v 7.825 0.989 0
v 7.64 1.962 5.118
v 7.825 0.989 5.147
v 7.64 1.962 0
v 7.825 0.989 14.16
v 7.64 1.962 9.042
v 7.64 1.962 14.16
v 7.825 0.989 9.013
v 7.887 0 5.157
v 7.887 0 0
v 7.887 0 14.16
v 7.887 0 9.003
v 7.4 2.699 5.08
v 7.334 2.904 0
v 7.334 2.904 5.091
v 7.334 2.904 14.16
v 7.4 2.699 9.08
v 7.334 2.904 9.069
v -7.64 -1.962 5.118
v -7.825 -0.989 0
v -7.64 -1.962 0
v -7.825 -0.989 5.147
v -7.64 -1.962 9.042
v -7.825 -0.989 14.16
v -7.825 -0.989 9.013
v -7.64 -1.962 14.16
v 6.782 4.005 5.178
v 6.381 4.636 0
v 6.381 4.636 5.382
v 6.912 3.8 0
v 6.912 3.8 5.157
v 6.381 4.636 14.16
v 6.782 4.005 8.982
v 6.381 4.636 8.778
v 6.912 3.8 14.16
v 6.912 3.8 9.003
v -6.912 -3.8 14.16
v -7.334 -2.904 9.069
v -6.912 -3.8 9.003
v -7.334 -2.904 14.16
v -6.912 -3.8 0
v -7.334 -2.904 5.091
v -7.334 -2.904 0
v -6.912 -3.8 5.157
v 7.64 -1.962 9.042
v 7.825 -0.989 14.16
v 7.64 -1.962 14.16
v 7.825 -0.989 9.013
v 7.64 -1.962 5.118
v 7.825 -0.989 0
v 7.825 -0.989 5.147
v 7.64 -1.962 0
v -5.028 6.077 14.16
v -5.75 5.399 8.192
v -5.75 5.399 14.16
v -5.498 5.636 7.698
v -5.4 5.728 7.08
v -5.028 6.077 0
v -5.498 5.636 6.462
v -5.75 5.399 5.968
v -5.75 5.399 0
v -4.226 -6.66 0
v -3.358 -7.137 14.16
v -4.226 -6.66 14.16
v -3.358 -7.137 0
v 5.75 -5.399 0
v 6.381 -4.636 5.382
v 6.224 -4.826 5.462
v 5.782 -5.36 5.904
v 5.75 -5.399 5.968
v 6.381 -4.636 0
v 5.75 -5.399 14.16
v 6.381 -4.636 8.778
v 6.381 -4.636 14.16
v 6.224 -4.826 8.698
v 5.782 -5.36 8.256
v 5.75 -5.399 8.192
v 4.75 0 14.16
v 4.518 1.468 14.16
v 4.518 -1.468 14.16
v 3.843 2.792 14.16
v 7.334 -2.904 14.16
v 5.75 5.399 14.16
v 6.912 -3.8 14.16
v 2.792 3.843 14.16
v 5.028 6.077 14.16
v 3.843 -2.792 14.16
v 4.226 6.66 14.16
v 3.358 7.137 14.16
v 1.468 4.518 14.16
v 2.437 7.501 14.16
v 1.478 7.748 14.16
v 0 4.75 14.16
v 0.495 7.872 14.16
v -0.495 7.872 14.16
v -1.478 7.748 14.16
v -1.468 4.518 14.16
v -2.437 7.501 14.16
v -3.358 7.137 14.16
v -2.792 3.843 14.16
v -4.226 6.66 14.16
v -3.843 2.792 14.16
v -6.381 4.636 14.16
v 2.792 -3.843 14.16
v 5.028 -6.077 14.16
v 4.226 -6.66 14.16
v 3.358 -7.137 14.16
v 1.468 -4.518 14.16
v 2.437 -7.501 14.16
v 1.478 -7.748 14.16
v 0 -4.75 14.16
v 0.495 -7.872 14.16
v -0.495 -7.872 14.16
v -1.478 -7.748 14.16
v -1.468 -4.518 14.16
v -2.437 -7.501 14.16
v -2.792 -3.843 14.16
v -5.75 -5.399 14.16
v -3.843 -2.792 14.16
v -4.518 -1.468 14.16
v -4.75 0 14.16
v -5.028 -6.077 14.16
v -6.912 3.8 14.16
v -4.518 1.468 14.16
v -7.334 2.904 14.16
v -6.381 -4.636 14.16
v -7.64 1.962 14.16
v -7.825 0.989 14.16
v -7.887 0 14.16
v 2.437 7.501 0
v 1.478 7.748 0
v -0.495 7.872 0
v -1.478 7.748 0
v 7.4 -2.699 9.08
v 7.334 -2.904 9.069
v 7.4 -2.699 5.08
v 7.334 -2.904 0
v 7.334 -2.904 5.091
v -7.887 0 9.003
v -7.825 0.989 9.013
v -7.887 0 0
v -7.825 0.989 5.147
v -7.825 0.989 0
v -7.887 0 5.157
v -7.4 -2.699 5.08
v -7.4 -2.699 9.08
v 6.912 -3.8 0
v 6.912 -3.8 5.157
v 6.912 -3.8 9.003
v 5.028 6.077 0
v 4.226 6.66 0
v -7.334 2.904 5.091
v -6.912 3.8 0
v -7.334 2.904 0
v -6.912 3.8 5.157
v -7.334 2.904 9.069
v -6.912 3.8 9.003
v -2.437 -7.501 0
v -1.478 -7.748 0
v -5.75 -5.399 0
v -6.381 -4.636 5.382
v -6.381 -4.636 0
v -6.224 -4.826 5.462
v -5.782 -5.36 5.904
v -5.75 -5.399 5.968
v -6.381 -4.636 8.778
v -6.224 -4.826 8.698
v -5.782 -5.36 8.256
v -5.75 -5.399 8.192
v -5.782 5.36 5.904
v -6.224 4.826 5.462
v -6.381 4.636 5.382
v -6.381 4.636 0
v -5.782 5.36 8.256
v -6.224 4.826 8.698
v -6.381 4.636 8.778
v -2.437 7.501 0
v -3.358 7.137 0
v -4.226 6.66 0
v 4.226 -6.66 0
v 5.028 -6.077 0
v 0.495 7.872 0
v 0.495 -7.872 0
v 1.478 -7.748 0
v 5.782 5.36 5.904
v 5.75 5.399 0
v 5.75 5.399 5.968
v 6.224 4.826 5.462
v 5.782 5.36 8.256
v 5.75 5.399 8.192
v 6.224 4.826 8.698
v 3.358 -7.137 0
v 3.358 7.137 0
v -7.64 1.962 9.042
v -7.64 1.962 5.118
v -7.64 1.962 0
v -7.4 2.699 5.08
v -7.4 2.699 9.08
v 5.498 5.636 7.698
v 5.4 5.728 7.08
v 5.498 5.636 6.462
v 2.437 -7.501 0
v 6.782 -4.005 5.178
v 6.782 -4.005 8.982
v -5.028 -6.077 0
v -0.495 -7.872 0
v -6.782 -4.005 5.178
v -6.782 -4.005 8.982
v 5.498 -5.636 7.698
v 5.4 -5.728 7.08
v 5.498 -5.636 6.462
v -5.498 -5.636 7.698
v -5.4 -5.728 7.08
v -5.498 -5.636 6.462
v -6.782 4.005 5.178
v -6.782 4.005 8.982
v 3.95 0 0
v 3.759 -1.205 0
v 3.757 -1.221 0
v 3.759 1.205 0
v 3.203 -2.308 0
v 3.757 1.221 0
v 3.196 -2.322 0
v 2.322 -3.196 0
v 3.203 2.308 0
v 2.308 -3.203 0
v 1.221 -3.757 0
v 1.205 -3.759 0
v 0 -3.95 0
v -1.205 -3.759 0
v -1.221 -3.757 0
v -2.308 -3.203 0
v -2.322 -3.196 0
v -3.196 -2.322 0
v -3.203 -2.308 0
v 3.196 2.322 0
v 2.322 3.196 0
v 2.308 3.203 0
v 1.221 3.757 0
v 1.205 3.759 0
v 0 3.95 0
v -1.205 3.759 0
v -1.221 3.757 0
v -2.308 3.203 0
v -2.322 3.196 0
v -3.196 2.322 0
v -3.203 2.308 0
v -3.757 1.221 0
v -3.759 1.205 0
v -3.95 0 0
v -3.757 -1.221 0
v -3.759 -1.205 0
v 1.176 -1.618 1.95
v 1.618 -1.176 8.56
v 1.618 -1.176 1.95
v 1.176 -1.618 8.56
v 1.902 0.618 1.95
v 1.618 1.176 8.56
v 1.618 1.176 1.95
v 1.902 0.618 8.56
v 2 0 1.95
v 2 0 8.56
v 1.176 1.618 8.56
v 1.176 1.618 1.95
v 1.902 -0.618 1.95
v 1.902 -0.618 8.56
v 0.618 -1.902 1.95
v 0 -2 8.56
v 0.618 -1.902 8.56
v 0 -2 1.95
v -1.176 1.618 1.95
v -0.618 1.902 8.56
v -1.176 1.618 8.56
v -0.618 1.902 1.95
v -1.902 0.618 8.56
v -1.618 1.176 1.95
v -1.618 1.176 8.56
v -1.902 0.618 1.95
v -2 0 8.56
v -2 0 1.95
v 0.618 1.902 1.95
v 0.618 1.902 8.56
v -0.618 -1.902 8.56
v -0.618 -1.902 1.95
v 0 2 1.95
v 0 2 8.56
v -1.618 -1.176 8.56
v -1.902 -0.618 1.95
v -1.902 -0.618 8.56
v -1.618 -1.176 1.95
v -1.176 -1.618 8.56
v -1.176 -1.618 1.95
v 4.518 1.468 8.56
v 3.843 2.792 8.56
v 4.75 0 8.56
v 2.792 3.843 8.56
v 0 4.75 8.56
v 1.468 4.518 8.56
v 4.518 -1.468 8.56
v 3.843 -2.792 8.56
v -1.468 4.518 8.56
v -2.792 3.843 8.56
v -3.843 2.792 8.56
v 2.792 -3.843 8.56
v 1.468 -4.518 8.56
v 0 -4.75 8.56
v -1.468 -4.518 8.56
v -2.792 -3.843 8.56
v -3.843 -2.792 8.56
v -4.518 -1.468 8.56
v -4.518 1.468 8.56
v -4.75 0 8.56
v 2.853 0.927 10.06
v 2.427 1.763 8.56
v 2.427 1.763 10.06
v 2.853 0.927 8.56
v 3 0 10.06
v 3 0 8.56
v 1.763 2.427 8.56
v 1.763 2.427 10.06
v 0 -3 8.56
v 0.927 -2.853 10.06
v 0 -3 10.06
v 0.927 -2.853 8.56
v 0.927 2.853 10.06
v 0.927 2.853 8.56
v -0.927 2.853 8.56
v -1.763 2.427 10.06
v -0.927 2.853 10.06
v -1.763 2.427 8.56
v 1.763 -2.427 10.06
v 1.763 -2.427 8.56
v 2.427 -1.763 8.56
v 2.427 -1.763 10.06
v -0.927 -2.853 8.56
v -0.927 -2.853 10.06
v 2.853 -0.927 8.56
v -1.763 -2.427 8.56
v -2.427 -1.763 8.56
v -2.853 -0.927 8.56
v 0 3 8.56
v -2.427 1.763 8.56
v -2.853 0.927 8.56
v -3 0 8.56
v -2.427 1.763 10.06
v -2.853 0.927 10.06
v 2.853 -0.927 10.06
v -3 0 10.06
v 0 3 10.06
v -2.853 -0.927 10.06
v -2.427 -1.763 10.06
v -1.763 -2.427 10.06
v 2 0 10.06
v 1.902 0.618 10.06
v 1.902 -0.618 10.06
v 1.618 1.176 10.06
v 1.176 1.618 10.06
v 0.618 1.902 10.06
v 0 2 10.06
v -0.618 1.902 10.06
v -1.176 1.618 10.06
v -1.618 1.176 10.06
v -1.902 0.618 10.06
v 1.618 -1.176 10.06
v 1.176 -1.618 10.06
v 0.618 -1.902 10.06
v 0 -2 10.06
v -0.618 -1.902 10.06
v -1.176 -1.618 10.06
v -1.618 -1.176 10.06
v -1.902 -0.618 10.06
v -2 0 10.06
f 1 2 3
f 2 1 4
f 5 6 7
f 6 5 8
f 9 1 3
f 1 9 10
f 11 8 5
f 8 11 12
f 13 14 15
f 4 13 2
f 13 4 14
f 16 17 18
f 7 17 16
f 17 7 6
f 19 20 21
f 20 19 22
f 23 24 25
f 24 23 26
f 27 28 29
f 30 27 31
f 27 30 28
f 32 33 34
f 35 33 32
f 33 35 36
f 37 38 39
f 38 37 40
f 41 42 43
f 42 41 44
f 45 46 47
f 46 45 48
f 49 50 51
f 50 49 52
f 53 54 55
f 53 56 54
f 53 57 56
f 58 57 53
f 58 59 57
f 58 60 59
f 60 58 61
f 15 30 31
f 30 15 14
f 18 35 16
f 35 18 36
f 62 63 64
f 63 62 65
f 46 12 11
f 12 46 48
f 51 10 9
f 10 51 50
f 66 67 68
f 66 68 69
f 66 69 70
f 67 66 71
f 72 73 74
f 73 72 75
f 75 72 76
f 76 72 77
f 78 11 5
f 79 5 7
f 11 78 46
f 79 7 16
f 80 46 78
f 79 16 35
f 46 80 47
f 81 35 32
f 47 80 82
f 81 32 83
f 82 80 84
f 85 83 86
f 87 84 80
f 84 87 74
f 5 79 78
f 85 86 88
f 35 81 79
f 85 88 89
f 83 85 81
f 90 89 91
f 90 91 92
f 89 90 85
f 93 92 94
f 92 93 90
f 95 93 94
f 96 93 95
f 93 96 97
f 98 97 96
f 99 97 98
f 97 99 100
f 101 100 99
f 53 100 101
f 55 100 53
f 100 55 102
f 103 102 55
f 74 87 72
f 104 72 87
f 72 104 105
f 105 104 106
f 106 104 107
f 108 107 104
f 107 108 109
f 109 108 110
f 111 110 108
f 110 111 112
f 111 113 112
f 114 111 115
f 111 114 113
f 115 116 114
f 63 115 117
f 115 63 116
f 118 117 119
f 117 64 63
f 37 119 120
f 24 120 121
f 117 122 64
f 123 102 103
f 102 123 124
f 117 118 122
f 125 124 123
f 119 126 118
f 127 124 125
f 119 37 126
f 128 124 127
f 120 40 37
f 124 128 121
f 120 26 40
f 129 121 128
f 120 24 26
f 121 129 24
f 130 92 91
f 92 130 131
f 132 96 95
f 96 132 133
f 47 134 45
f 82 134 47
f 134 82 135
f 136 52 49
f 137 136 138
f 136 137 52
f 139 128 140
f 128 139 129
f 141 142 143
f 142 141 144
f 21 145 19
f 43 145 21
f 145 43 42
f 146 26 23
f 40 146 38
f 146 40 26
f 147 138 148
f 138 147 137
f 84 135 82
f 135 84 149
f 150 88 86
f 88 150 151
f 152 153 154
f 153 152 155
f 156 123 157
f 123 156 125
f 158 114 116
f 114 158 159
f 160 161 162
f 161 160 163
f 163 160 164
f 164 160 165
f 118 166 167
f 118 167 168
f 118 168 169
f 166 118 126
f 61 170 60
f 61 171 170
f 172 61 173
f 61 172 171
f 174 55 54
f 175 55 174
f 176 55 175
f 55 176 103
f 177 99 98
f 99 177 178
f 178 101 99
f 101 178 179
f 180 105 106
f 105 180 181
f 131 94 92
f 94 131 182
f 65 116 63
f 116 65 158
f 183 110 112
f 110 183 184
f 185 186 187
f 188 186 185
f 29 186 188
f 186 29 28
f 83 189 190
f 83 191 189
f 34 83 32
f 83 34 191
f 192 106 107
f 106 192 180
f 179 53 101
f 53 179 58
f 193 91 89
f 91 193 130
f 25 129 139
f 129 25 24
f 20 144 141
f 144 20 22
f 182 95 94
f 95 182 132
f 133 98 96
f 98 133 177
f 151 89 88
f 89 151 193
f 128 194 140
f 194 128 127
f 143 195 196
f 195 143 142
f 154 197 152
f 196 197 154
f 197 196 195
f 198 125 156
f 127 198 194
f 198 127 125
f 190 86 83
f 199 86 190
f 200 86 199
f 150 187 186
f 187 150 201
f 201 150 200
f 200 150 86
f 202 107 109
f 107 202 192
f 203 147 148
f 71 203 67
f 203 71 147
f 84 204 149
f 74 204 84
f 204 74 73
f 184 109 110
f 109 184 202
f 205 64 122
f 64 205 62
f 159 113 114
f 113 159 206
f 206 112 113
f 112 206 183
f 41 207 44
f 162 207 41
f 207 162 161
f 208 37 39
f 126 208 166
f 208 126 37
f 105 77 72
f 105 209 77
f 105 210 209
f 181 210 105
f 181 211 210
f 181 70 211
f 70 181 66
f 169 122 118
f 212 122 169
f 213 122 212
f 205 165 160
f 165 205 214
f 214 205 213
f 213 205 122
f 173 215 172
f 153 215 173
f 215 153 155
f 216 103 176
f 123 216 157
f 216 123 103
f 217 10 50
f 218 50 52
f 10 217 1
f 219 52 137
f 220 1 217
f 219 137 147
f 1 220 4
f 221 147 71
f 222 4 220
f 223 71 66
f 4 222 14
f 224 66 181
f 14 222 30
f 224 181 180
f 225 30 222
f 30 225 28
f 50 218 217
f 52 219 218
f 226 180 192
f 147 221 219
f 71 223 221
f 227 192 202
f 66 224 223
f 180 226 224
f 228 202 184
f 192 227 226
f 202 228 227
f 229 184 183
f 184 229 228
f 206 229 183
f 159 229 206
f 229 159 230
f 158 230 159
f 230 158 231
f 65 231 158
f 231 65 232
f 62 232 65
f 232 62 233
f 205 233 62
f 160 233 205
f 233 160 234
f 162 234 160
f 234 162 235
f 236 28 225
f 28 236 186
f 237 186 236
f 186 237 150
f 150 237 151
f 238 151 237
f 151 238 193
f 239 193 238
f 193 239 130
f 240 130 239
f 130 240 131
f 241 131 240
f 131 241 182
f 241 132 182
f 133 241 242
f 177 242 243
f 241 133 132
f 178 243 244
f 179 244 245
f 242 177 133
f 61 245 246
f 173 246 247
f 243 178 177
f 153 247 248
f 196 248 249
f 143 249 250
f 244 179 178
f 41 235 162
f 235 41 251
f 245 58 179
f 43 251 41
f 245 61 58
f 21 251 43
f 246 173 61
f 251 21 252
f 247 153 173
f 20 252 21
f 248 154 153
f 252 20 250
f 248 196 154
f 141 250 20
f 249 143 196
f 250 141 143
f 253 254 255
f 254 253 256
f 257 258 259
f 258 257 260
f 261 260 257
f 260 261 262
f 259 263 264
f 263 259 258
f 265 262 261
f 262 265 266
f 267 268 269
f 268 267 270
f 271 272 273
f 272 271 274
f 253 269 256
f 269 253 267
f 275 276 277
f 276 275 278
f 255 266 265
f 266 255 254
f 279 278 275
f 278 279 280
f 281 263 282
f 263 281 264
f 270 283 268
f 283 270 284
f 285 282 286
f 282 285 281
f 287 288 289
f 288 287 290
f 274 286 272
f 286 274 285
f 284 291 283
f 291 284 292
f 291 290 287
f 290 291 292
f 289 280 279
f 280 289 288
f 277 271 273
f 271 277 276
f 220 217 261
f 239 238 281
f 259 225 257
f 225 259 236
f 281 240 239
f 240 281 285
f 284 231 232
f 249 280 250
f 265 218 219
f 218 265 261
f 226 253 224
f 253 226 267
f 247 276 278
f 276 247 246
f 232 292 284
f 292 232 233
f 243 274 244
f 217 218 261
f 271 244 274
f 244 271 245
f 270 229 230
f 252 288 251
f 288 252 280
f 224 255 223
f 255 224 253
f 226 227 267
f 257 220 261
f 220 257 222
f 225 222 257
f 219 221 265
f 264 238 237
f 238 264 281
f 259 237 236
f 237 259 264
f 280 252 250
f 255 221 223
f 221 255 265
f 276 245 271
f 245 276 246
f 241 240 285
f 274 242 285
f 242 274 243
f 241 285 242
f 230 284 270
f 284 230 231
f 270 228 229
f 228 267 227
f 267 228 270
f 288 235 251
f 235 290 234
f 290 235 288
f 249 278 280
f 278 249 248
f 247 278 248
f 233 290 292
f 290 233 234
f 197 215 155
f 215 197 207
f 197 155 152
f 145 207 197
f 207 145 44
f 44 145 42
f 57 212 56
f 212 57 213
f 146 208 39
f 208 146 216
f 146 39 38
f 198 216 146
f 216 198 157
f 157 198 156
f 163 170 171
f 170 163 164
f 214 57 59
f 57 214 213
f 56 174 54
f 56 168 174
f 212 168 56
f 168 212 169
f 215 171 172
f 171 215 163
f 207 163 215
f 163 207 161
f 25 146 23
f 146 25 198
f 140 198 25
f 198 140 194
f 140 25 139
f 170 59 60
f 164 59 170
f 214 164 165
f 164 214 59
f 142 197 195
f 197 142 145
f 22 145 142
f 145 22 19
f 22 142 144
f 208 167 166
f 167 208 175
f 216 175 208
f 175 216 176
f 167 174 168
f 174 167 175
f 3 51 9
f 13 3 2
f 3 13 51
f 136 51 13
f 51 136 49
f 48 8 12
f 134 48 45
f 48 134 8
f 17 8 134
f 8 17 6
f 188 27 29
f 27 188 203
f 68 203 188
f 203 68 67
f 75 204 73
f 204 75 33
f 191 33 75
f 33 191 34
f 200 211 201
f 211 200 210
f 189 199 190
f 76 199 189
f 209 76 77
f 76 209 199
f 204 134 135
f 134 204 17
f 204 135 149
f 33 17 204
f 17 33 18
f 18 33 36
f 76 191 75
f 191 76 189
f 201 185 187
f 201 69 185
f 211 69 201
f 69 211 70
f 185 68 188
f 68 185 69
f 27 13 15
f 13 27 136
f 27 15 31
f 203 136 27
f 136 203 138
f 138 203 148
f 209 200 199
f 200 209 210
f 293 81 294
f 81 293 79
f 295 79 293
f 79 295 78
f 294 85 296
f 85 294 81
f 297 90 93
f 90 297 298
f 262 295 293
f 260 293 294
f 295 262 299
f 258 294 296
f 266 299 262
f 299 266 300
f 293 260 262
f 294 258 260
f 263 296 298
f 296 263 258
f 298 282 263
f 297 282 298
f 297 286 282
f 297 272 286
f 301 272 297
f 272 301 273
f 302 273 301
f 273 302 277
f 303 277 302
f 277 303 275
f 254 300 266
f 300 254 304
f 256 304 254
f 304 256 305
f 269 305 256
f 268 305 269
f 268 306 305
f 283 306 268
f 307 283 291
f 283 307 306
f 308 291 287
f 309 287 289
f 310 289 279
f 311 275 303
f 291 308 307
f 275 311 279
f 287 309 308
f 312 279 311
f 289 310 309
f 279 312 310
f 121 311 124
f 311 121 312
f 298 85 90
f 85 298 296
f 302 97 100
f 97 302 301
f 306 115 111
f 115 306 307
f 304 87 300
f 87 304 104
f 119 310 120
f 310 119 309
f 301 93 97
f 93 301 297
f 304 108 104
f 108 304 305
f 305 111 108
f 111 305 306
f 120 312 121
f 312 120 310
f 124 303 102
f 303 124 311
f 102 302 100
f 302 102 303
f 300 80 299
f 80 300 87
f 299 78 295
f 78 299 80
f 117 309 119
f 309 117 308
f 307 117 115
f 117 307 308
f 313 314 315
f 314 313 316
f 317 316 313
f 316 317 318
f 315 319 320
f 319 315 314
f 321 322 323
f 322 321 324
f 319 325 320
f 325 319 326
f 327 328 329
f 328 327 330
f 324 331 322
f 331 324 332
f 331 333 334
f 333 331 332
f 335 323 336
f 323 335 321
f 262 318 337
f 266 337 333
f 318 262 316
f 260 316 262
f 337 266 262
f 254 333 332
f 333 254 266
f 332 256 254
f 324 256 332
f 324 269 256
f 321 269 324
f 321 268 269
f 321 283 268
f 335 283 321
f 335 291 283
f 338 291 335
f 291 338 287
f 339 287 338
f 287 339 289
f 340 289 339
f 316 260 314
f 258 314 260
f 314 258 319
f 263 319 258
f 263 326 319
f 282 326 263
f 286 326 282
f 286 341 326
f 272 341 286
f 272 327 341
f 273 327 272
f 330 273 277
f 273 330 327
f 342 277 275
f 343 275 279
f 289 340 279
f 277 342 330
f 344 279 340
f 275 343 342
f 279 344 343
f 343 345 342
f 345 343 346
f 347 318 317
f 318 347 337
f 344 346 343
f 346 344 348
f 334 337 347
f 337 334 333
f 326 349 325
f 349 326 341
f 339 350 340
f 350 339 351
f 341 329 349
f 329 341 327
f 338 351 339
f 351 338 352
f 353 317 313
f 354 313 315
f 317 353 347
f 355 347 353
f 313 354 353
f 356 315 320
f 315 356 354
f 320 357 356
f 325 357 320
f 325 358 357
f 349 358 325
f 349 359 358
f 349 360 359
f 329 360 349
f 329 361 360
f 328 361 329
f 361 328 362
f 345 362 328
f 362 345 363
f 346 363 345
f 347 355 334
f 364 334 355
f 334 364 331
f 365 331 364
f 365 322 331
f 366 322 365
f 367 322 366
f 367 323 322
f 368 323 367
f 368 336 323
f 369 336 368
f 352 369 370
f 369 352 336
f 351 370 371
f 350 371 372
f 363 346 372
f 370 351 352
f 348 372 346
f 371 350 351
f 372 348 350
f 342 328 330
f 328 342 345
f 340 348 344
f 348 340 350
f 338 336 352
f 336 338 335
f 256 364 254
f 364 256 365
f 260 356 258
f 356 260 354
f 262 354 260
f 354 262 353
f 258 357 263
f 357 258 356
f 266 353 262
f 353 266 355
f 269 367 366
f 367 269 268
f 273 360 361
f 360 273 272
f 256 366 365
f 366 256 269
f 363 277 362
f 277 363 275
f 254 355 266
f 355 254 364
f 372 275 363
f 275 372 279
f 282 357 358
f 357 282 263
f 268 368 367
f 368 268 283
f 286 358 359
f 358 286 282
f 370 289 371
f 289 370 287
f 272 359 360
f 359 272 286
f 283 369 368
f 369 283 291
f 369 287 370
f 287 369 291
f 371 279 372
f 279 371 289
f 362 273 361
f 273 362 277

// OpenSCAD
tol = 0.1;

union(){

	difference(){
		// Main body:
		cylinder( r = 15.875/2 - tol/2, h = 4.76 + 4.64 + 4.76, $fn=50 );

		// Filament hole:
		translate( [ 0, 0, -0.05 ] )
			cylinder( r = 2, h = 4.76 + 4.64 + 4.76 + 0.1, $fn = 20 );

		// Filament hole entry:
		translate( [ 0, 0, -0.05 ] )
			cylinder( r1 = 4, r2 = 2, h = 2, $fn = 20 );

		// Screw holes:
		translate( [ -14.8 / 2, 0, 4.76 + 4.64 / 2 ] ) rotate( 90, [ 1, 0, 0 ] )
			cylinder( r = 2, h = 16, $fn = 20, center = true );
		translate( [ 14.8 / 2, 0, 4.76 + 4.64 / 2 ] ) rotate( 90, [ 1, 0, 0 ] )
			cylinder( r = 2, h = 16, $fn = 20, center = true );

		// Push-fit mount:
		translate( [ 0, 0, 4.76 + 4.64 + 4.76 - 5.6 ] )
			cylinder( r = 9.5 / 2, h = 5.6 + 0.1, $fn = 20 );

	}
			
	// Push-fit guide:
	translate( [ 0, 0, 4.76 + 4.64 + 4.76 - 5.6 ] )
		difference(){
			cylinder( r = 3, h = 1.5, $fn =20 );
			translate( [ 0, 0, -0.05 ] )
				cylinder( r = 2, h = 1.5 + 0.1, $fn =20 );
		}
}
